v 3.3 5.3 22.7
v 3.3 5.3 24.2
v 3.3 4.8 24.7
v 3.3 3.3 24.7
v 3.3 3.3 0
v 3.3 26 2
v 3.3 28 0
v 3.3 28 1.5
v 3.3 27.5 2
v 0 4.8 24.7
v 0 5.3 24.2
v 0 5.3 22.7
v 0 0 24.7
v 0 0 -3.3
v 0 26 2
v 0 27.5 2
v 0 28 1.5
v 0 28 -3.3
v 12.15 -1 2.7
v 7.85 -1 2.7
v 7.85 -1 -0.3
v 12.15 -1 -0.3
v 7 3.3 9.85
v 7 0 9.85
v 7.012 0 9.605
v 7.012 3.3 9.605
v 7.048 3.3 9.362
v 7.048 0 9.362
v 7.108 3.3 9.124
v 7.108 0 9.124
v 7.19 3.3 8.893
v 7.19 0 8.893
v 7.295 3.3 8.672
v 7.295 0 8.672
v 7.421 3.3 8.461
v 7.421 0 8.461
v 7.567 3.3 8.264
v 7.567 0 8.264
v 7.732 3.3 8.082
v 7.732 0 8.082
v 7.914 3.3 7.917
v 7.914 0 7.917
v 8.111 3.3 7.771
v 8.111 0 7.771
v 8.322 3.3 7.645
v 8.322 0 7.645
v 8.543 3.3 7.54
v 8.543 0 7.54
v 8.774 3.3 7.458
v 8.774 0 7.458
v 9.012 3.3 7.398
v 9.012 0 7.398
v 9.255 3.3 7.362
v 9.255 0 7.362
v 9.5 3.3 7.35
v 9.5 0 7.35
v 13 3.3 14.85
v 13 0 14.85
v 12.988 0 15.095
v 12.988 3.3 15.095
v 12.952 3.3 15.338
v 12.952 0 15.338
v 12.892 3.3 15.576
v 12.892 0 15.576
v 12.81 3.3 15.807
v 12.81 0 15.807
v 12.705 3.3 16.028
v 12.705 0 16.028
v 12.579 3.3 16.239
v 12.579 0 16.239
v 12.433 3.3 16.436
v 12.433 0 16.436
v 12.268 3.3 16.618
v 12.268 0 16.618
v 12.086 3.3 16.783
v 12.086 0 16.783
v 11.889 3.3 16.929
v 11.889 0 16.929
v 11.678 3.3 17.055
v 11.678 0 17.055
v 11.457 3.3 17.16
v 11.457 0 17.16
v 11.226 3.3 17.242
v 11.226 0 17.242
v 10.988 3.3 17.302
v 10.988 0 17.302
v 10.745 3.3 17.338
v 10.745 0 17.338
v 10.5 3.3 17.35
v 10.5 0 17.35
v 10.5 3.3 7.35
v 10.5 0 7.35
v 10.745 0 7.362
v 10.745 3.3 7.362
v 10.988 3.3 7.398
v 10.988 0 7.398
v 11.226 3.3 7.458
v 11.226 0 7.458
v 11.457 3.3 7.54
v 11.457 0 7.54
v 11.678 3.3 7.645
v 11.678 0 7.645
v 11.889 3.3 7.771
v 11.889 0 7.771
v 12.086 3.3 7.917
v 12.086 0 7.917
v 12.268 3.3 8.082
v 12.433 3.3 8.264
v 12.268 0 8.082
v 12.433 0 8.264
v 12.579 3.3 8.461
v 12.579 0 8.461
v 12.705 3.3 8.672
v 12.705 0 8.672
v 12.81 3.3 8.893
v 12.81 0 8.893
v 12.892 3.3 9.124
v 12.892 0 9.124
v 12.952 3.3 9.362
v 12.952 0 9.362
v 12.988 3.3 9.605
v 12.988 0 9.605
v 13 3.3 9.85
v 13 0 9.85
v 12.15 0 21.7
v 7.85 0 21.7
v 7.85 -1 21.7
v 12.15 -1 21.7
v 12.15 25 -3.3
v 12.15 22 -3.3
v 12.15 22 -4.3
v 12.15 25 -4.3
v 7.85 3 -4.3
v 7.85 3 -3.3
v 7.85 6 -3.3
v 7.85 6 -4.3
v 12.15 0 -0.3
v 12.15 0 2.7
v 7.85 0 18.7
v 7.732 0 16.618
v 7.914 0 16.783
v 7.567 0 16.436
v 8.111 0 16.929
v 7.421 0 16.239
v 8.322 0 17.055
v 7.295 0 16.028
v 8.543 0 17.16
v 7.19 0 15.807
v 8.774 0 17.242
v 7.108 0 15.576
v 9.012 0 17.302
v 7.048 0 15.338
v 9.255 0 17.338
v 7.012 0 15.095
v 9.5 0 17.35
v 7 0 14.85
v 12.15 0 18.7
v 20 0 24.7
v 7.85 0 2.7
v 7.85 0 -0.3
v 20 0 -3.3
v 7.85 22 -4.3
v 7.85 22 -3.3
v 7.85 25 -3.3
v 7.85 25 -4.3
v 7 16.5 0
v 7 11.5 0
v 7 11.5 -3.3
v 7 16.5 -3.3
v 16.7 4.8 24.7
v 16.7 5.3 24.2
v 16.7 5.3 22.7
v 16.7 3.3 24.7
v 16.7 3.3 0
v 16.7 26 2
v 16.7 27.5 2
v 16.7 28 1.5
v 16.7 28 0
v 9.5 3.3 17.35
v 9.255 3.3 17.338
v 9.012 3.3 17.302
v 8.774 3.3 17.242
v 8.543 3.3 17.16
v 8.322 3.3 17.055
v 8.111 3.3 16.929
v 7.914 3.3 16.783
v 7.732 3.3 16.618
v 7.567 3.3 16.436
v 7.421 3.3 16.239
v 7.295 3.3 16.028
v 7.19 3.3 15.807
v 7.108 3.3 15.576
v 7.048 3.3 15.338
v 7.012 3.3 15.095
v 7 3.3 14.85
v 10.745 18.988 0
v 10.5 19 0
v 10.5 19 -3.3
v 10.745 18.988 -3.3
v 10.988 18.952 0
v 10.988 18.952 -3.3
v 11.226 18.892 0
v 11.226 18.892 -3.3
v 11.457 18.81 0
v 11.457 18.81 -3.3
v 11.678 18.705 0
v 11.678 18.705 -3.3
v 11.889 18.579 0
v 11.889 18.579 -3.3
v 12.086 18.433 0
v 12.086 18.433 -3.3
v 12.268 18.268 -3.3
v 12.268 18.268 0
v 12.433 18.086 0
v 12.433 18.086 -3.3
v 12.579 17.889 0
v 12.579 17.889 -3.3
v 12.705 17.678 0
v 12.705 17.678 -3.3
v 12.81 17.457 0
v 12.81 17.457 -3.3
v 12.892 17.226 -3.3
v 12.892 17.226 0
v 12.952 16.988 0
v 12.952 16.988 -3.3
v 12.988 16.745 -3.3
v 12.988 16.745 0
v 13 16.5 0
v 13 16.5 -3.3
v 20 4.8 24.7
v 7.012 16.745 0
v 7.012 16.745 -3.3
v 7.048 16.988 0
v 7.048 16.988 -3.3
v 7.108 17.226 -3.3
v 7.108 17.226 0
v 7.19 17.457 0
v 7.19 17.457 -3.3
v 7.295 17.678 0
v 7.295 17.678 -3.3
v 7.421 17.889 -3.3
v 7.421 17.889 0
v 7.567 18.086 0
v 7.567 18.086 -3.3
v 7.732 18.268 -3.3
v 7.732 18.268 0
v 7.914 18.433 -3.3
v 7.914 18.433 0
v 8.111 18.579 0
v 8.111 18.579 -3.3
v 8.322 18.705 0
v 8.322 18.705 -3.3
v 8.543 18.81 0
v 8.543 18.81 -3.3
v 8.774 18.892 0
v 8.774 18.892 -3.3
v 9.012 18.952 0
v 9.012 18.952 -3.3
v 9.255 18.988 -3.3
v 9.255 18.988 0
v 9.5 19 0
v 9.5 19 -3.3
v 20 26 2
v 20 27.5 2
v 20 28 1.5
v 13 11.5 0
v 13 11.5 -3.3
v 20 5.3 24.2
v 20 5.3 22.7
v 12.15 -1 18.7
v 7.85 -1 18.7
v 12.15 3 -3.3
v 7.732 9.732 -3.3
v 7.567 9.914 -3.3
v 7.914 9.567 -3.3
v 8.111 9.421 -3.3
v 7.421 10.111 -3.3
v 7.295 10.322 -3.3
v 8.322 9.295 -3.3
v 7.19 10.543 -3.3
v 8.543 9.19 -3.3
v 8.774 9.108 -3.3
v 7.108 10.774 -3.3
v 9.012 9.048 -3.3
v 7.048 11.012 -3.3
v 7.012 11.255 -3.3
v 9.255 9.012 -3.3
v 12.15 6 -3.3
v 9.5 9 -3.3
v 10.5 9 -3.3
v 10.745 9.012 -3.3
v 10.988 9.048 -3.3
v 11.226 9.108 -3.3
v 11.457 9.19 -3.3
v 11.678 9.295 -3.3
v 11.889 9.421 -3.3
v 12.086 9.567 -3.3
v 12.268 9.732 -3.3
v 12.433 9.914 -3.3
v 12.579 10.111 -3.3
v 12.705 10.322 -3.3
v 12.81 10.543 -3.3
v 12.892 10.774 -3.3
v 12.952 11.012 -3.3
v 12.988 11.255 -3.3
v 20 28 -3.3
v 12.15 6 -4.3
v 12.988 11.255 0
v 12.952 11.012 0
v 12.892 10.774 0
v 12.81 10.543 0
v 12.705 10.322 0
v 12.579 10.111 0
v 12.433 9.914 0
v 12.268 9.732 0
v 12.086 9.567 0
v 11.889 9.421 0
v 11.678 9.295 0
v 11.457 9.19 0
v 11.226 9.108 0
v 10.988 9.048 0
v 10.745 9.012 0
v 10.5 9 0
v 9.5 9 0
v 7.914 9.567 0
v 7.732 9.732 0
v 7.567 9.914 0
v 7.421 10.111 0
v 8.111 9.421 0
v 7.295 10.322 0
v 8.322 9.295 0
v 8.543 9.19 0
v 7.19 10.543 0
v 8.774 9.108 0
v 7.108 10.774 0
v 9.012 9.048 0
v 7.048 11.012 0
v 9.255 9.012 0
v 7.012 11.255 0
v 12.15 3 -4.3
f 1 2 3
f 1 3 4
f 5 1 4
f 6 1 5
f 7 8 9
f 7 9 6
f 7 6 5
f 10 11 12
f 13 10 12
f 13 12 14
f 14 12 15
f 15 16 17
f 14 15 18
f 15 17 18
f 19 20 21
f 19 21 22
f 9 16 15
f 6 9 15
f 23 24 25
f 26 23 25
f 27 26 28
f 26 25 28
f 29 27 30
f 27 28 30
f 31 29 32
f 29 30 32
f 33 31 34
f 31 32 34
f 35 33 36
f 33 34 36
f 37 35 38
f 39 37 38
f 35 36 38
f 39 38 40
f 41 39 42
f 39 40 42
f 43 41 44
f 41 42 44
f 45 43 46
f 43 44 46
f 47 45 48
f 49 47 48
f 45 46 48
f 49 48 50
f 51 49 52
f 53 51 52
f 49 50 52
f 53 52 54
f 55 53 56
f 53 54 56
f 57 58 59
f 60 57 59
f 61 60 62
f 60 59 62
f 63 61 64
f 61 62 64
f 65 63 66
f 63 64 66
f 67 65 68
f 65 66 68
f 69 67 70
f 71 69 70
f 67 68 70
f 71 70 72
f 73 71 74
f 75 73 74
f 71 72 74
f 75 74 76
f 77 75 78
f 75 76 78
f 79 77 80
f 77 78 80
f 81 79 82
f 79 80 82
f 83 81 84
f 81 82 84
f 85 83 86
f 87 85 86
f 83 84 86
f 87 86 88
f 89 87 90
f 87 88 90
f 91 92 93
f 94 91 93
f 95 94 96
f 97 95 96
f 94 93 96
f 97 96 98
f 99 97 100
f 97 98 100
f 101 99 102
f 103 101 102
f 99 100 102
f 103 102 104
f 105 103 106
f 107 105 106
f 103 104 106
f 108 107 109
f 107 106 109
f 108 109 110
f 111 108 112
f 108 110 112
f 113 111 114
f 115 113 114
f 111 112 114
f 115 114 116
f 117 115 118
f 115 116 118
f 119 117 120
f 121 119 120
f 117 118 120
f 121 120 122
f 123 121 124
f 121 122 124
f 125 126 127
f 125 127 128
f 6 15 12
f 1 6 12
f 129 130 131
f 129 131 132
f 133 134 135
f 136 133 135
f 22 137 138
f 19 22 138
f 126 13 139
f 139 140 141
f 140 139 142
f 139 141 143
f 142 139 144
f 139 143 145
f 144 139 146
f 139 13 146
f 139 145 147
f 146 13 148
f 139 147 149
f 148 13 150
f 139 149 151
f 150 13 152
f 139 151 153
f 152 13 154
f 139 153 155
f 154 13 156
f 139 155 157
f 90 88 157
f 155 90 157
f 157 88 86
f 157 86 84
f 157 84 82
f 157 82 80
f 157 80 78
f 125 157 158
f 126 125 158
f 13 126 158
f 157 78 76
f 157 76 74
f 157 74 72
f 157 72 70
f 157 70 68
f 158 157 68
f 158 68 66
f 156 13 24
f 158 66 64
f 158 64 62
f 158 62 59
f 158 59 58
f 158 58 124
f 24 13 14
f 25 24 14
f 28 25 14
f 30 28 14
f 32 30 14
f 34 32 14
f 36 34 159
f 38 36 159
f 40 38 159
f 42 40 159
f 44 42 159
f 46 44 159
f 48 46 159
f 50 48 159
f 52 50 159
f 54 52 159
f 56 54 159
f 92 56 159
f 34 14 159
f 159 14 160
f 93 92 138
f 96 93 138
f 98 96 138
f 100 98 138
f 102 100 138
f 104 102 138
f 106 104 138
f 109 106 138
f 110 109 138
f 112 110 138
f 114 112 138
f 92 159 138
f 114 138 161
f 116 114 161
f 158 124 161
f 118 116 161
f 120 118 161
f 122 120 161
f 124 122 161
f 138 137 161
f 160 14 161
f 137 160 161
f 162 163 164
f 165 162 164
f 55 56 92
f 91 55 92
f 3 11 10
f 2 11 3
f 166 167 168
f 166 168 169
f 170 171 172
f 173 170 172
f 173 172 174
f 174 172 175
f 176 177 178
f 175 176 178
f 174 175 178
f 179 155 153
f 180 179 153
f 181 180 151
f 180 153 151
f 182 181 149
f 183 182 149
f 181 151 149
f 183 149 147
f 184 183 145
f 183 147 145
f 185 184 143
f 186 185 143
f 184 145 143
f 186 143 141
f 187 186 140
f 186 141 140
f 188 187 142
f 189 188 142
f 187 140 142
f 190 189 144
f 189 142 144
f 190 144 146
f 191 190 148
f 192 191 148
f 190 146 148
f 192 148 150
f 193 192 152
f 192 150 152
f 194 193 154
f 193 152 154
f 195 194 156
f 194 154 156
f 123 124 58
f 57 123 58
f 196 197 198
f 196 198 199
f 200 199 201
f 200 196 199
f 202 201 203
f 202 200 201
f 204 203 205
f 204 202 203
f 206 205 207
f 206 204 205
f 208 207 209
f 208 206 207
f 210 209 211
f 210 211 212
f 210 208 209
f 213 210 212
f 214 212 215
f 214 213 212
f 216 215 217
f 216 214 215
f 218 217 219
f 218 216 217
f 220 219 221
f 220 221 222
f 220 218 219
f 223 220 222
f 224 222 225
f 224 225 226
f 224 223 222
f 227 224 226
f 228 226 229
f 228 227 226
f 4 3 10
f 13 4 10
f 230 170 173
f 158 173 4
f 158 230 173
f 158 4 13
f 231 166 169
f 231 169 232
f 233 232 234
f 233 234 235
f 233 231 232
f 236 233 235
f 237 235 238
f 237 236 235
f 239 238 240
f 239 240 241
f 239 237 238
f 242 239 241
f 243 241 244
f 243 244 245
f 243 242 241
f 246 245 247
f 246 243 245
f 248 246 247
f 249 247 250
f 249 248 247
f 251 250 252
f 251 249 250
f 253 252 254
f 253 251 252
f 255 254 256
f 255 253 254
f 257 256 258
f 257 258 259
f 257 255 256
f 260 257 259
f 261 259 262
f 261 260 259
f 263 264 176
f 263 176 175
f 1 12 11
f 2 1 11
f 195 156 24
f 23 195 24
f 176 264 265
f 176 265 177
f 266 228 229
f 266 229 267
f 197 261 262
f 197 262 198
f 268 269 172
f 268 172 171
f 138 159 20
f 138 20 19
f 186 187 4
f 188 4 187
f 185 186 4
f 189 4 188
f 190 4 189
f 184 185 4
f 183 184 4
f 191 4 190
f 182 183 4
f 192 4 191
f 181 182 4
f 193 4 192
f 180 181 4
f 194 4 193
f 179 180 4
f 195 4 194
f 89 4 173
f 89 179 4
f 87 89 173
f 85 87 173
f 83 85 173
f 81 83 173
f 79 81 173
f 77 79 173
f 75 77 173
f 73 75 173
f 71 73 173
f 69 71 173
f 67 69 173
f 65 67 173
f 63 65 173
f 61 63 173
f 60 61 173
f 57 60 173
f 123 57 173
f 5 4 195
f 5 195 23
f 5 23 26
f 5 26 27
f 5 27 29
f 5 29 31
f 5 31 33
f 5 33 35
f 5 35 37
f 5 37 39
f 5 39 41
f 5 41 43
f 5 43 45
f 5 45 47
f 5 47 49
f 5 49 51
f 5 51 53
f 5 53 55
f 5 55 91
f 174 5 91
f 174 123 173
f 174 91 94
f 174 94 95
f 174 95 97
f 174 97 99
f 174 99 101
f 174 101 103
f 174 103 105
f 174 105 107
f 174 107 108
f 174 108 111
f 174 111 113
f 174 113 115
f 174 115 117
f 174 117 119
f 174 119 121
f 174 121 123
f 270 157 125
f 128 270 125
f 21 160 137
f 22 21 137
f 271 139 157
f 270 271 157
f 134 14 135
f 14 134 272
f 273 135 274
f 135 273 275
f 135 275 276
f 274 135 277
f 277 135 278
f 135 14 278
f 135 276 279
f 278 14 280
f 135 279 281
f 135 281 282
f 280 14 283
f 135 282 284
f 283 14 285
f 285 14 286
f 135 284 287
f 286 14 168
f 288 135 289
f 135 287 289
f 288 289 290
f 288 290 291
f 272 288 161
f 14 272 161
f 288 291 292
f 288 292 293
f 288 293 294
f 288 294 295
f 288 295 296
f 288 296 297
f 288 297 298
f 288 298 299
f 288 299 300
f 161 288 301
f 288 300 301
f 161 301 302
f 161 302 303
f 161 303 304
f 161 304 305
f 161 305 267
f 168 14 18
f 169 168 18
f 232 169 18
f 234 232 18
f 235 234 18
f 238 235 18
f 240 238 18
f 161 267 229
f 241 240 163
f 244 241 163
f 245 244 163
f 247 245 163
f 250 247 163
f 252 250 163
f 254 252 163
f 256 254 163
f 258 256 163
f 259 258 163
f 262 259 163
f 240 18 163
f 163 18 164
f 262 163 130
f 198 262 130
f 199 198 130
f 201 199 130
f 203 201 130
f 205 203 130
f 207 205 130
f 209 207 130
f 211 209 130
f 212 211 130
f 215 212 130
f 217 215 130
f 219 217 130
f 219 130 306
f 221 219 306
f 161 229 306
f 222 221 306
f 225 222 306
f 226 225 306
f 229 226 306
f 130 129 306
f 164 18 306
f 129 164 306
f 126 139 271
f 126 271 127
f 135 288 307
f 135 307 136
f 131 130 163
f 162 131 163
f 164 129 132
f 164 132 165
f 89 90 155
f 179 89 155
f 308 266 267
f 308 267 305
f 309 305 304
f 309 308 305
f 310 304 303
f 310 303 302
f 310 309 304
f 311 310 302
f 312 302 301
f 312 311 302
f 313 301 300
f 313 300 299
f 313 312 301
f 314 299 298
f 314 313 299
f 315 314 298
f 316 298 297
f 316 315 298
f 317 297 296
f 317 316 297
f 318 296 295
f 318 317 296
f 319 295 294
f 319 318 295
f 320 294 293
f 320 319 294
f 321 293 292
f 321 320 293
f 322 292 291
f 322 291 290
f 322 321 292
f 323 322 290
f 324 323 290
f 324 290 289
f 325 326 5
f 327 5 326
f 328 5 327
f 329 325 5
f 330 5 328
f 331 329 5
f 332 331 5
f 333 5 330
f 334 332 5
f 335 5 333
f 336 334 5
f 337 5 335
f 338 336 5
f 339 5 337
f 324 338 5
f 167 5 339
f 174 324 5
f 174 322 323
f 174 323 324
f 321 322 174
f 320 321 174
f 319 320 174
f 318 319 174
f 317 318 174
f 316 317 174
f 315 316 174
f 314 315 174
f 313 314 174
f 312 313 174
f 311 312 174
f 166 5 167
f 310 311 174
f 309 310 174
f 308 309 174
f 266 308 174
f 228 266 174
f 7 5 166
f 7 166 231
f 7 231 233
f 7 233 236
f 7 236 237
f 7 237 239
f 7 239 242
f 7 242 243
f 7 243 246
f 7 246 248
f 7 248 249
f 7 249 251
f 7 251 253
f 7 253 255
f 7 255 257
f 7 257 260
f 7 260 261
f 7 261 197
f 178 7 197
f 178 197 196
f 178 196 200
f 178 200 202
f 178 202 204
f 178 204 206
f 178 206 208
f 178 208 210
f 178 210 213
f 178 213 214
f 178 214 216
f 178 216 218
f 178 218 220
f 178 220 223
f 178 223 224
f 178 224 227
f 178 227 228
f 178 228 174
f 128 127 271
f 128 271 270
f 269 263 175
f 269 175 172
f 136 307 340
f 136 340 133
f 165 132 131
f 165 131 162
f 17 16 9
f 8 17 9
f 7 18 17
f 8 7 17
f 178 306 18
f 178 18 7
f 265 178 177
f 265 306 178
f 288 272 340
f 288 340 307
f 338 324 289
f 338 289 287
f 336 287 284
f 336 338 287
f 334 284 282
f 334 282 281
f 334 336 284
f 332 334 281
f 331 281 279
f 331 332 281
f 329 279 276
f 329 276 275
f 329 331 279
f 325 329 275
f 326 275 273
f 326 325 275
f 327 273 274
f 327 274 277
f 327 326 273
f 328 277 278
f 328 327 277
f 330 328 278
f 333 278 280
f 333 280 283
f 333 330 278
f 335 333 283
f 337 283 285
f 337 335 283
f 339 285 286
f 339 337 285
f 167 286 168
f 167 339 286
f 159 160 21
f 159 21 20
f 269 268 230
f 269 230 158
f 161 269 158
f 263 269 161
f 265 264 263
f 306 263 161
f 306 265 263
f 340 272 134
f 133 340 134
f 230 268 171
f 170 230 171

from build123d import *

# Parameters (mm, degrees)
SKETCH1_W           = 20
SKETCH1_H           = 28
BOSS_EXTRUDE1_DEPTH = 3.3
SKETCH2_W           = 20
SKETCH2_H           = 24.7
BOSS_EXTRUDE2_DEPTH = 3.3
BOSS_EXTRUDE3_DEPTH = 3.3
BOSS_EXTRUDE4_DEPTH = 3.3
CHAMFER1_SIZE       = 0.5
SKETCH5_W           = 4.3
SKETCH5_H           = 3
BOSS_EXTRUDE5_DEPTH = 1
SKETCH6_W           = 4.3
SKETCH6_H           = 3
BOSS_EXTRUDE6_DEPTH = 1


with BuildPart() as part:
    # Sketch1 → Boss-Extrude1 (new body)
    with BuildSketch(Plane.XY):
        with Locations((10, 14)):
            Rectangle(SKETCH1_W, SKETCH1_H)
        with BuildLine():
            Line((10.5, 9), (9.5, 9))
            ThreePointArc((9.5, 9), (7.732233047, 9.732233047), (7, 11.5))
            Line((7, 11.5), (7, 16.5))
            ThreePointArc((7, 16.5), (7.732233047, 18.267766953), (9.5, 19))
            Line((9.5, 19), (10.5, 19))
            ThreePointArc((10.5, 19), (12.267766953, 18.267766953), (13, 16.5))
            Line((13, 16.5), (13, 11.5))
            ThreePointArc((13, 11.5), (12.267766953, 9.732233047), (10.5, 9))
        make_face(mode=Mode.SUBTRACT)
    extrude(amount=-BOSS_EXTRUDE1_DEPTH)

    # Sketch2 → Boss-Extrude2 (add)
    with BuildSketch(Plane(origin=(0, 0, 0), x_dir=(1, 0, 0), z_dir=(0, 1, 0))):
        with Locations((10, -12.35)):
            Rectangle(SKETCH2_W, SKETCH2_H)
        with BuildLine():
            Line((10.5, -17.35), (9.5, -17.35))
            ThreePointArc((9.5, -17.35), (7.732233047, -16.617766953), (7, -14.85))
            Line((7, -14.85), (7, -9.85))
            ThreePointArc((7, -9.85), (7.732233047, -8.082233047), (9.5, -7.35))
            Line((9.5, -7.35), (10.5, -7.35))
            ThreePointArc((10.5, -7.35), (12.267766953, -8.082233047), (13, -9.85))
            Line((13, -9.85), (13, -14.85))
            ThreePointArc((13, -14.85), (12.267766953, -16.617766953), (10.5, -17.35))
        make_face(mode=Mode.SUBTRACT)
    extrude(amount=BOSS_EXTRUDE2_DEPTH)

    # Sketch3 → Boss-Extrude3 (add)
    with BuildSketch(Plane(origin=(0, 0, 0), x_dir=(0, 0, -1), z_dir=(1, 0, 0))):
        Polygon((0, 28), (-2, 28), (-2, 26), (-22.7, 5.3), (-24.7, 5.3), (-24.7, 3.3), (0, 3.3), align=None)
    extrude(amount=BOSS_EXTRUDE3_DEPTH)

    # Sketch4 → Boss-Extrude4 (add)
    with BuildSketch(Plane(origin=(20, 0, 0), x_dir=(0, 0, -1), z_dir=(1, 0, 0))):
        Polygon((0, 28), (-2, 28), (-2, 26), (-22.7, 5.3), (-24.7, 5.3), (-24.7, 3.3), (0, 3.3), align=None)
    extrude(amount=-BOSS_EXTRUDE4_DEPTH)

    # Chamfer1
    chamfer1_edges = [part.edges().sort_by_distance(p)[0] for p in [
        (1.65, 28, 2),
        (1.65, 5.3, 24.7),
        (18.35, 5.3, 24.7),
        (18.35, 28, 2),
    ]]
    chamfer(chamfer1_edges, length=CHAMFER1_SIZE)

    # Sketch5 → Boss-Extrude5 (add)
    with BuildSketch(Plane(origin=(0, 0, -3.3), x_dir=(-1, 0, 0), z_dir=(0, 0, -1))):
        with Locations((-10, 23.5)):
            Rectangle(SKETCH5_W, SKETCH5_H)
        with Locations((-10, 4.5)):
            Rectangle(SKETCH5_W, SKETCH5_H)
    extrude(amount=BOSS_EXTRUDE5_DEPTH)

    # Sketch6 → Boss-Extrude6 (add)
    with BuildSketch(Plane.XZ):
        with Locations((10, 1.2)):
            Rectangle(SKETCH6_W, SKETCH6_H)
        with Locations((10, 20.2)):
            Rectangle(SKETCH6_W, SKETCH6_H)
    extrude(amount=BOSS_EXTRUDE6_DEPTH)


solid = part.part
